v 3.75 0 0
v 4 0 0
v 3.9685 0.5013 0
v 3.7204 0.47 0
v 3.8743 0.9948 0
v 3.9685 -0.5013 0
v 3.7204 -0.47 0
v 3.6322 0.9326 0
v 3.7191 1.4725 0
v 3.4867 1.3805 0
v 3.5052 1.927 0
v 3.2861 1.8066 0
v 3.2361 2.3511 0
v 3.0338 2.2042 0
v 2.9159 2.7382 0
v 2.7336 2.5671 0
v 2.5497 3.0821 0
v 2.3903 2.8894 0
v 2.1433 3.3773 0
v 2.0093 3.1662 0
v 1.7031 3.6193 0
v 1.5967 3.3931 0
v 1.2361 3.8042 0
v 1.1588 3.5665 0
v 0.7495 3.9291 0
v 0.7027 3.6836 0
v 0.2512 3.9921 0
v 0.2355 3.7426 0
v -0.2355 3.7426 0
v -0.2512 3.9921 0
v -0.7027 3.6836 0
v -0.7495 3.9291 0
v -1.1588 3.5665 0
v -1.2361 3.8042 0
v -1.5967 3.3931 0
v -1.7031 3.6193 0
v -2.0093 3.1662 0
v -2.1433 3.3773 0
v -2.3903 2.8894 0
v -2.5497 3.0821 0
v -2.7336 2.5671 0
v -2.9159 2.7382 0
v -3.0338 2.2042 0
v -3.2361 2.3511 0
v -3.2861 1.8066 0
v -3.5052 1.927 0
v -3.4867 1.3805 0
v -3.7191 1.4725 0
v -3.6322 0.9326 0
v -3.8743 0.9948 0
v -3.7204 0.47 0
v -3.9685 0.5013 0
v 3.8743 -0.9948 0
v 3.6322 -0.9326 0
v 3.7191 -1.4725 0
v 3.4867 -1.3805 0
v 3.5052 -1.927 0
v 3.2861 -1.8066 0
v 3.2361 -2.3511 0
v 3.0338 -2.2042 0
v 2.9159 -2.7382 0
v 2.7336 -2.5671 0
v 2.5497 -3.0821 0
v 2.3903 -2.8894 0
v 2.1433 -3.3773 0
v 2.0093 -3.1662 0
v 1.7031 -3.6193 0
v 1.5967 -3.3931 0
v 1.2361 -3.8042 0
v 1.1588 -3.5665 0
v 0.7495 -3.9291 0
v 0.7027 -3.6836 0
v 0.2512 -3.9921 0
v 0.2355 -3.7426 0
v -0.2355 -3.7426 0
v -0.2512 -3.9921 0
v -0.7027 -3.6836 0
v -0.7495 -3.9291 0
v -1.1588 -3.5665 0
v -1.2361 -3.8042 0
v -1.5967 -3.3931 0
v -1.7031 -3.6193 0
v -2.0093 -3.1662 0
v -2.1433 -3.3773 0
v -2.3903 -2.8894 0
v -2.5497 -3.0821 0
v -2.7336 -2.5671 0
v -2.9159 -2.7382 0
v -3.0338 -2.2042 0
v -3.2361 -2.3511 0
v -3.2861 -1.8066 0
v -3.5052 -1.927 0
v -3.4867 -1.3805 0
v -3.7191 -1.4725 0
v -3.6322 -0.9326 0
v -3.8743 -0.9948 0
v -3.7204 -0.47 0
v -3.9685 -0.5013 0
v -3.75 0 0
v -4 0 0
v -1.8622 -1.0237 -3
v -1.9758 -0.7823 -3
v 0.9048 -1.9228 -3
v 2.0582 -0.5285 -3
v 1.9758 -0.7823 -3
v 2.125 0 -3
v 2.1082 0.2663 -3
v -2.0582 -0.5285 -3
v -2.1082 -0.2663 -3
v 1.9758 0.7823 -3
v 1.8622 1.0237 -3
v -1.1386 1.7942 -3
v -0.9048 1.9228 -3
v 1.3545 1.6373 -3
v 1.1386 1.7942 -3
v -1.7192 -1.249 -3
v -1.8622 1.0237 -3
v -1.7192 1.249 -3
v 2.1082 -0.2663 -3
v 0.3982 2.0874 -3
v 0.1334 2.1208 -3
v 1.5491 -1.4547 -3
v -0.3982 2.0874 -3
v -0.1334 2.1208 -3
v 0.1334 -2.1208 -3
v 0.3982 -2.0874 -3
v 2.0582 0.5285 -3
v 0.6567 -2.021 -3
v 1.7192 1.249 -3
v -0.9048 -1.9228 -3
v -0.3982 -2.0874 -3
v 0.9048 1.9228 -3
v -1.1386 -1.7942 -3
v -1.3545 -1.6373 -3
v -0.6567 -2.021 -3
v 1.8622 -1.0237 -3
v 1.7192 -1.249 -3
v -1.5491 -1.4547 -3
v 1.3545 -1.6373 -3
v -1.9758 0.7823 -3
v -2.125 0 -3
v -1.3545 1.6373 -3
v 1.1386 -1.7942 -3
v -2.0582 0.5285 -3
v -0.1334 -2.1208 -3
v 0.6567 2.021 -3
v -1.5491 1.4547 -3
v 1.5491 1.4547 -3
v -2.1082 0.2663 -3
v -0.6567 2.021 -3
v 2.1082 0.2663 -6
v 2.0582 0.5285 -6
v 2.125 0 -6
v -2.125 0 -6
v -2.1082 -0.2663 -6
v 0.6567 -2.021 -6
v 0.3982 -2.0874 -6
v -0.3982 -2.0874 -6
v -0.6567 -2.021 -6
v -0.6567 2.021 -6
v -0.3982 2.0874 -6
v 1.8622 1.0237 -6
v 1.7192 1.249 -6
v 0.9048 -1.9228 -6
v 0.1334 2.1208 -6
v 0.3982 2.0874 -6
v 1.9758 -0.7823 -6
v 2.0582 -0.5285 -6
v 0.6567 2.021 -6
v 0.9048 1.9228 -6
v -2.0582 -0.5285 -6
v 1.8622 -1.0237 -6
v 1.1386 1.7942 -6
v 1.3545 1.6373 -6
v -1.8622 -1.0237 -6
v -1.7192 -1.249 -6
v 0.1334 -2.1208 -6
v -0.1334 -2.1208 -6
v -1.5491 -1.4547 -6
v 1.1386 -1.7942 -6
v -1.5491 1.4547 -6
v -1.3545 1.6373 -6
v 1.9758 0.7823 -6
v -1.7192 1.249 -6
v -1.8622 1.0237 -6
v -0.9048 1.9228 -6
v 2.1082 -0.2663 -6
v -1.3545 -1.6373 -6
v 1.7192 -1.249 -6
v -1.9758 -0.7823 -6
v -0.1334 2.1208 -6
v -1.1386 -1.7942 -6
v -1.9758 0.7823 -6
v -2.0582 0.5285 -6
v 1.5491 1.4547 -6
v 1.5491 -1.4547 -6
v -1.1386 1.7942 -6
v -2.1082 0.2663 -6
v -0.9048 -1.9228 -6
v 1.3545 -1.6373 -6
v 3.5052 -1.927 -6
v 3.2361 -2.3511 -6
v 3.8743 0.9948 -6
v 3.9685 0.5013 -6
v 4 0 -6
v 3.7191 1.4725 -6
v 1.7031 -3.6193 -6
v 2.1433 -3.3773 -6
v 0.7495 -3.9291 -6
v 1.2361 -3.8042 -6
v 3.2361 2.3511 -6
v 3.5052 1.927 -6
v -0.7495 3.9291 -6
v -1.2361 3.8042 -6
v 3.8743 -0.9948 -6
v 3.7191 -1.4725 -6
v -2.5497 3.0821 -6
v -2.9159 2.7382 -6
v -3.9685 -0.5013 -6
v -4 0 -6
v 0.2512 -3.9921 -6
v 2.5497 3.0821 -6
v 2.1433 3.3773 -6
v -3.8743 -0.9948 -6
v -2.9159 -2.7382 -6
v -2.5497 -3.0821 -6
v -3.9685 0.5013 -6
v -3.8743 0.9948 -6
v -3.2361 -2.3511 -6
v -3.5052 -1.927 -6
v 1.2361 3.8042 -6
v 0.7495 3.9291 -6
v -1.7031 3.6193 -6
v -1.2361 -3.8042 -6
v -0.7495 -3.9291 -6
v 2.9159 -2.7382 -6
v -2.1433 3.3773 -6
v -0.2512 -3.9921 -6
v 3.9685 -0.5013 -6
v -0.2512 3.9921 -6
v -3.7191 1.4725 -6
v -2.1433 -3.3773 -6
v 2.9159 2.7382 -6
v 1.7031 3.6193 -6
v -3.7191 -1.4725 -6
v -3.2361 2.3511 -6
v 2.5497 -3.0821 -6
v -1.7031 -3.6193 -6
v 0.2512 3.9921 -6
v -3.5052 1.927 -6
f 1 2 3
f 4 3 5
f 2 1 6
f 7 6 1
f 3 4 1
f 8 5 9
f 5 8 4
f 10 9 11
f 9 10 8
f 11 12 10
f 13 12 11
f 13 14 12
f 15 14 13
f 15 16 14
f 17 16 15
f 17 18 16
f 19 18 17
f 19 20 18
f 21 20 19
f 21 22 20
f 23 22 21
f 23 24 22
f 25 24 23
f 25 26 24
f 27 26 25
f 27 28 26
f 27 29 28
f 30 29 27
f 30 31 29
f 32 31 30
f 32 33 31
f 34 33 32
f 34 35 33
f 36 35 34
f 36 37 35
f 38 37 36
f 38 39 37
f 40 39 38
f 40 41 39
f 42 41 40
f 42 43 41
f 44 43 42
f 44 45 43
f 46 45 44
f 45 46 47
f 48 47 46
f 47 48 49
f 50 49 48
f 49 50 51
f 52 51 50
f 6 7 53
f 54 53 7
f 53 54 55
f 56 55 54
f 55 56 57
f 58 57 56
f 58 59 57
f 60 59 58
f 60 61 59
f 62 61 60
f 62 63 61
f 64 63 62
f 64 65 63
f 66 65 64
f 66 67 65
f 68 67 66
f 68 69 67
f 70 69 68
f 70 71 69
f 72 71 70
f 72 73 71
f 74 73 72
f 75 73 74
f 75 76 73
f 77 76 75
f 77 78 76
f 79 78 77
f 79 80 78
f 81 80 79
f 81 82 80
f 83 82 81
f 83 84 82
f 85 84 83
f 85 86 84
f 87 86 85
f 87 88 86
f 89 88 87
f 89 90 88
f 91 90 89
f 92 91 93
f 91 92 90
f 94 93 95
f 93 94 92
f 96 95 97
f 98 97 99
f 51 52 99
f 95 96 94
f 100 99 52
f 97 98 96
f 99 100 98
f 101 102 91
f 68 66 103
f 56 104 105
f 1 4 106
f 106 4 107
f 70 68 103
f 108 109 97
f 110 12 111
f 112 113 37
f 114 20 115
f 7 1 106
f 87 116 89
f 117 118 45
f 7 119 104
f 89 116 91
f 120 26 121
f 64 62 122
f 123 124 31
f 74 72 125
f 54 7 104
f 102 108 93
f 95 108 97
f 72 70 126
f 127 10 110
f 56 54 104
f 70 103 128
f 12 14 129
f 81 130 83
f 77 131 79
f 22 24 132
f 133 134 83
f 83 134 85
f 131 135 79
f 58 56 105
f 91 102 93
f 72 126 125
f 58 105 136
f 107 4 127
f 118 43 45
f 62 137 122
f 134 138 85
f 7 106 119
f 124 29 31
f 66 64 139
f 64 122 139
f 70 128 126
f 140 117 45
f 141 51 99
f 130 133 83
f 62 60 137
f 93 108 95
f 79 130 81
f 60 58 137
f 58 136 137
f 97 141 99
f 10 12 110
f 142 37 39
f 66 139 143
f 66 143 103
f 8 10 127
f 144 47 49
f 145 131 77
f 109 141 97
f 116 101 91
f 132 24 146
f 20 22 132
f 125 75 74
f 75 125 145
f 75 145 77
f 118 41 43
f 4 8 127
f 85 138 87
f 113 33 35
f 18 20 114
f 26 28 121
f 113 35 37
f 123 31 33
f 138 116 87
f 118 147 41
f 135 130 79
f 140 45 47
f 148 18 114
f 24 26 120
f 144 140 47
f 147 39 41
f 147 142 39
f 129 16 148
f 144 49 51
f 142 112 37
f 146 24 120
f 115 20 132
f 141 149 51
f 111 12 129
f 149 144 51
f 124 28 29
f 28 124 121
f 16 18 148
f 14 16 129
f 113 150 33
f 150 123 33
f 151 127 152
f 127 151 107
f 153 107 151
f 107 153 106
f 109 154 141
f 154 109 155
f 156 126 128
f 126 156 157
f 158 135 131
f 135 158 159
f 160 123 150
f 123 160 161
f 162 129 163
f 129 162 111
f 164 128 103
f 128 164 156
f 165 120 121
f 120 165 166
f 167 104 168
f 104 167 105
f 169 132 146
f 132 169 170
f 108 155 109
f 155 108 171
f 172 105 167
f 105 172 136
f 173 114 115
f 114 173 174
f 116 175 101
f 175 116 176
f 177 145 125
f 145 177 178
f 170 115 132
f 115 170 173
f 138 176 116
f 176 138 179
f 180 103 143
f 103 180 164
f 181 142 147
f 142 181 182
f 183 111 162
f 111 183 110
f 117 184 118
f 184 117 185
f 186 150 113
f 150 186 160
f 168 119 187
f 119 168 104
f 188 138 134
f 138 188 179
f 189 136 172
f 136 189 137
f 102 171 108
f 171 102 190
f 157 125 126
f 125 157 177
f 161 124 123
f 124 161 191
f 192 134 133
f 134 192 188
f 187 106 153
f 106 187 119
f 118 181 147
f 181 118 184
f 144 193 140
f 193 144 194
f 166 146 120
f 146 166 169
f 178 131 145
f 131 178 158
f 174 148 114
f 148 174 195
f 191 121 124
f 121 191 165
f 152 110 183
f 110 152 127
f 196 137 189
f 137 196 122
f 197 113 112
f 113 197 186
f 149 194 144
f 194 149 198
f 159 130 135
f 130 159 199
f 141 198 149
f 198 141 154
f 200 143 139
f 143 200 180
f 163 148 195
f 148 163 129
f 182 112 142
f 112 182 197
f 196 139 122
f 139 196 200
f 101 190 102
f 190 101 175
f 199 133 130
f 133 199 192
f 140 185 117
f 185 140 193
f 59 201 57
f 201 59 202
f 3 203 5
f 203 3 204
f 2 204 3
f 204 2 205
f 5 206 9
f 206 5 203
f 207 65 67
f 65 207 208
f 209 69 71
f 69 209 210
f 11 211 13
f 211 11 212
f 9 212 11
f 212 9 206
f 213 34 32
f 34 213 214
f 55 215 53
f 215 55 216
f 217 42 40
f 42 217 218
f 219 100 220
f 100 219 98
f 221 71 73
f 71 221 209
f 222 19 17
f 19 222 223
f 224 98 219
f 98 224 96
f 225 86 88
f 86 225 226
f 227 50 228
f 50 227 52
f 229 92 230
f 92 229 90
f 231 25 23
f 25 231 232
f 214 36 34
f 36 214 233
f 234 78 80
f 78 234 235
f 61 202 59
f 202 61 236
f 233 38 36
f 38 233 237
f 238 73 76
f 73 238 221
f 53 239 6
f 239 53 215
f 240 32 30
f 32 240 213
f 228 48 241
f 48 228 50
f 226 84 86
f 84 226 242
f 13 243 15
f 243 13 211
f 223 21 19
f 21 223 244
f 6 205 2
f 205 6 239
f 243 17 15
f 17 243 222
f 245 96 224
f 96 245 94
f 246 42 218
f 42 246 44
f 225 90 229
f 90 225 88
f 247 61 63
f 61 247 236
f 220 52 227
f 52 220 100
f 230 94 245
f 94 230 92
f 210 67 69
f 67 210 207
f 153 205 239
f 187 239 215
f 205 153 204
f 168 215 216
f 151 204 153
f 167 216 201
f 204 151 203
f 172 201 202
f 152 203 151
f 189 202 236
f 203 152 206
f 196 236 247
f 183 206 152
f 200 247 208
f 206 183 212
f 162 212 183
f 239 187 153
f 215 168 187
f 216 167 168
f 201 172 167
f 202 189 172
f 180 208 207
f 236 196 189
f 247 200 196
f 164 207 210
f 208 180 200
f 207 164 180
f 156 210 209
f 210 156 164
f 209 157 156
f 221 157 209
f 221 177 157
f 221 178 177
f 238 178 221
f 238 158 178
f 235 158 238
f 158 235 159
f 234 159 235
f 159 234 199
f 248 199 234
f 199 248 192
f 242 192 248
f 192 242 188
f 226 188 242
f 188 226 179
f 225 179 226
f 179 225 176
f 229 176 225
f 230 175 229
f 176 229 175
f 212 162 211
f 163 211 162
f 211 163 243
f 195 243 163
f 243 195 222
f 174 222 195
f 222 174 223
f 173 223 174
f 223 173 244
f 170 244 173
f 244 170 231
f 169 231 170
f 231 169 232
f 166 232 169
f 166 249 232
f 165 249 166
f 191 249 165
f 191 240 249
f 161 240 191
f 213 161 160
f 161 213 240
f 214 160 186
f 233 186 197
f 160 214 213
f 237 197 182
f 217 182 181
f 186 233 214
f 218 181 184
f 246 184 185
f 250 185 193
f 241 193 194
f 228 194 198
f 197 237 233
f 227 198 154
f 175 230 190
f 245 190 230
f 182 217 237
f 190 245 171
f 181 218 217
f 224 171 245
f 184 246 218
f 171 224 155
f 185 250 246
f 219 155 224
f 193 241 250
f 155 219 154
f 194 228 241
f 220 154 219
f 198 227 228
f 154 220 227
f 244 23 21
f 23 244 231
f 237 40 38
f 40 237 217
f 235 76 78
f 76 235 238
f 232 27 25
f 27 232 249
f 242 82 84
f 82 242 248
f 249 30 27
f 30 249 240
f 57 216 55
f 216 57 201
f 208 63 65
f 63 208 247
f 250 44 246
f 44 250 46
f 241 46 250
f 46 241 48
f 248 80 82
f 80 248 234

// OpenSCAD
$fn = 50;

difference() {
	union() {
		translate(v = [0, 0, -6.0]) {
			cylinder(h = 9, r = 4.0);
		}
	}
	union() {
		translate(v = [0, 0, 0]) {
			rotate(a = [0, 0, 0]) {
				difference() {
					union() {
						translate(v = [0, 0, -9.0]) {
							cylinder(h = 9, r = 2.0);
						}
						translate(v = [0, 0, -3]) {
							cylinder(h = 3, r1 = 2.125, r2 = 3.75);
						}
						translate(v = [0, 0, -9.0]) {
							cylinder(h = 9, r = 2.125);
						}
						translate(v = [0, 0, -9.0]) {
							cylinder(h = 9, r = 2.0);
						}
					}
					union();
				}
			}
		}
		#cylinder(h = 3, r = 5.0);
	}
}
